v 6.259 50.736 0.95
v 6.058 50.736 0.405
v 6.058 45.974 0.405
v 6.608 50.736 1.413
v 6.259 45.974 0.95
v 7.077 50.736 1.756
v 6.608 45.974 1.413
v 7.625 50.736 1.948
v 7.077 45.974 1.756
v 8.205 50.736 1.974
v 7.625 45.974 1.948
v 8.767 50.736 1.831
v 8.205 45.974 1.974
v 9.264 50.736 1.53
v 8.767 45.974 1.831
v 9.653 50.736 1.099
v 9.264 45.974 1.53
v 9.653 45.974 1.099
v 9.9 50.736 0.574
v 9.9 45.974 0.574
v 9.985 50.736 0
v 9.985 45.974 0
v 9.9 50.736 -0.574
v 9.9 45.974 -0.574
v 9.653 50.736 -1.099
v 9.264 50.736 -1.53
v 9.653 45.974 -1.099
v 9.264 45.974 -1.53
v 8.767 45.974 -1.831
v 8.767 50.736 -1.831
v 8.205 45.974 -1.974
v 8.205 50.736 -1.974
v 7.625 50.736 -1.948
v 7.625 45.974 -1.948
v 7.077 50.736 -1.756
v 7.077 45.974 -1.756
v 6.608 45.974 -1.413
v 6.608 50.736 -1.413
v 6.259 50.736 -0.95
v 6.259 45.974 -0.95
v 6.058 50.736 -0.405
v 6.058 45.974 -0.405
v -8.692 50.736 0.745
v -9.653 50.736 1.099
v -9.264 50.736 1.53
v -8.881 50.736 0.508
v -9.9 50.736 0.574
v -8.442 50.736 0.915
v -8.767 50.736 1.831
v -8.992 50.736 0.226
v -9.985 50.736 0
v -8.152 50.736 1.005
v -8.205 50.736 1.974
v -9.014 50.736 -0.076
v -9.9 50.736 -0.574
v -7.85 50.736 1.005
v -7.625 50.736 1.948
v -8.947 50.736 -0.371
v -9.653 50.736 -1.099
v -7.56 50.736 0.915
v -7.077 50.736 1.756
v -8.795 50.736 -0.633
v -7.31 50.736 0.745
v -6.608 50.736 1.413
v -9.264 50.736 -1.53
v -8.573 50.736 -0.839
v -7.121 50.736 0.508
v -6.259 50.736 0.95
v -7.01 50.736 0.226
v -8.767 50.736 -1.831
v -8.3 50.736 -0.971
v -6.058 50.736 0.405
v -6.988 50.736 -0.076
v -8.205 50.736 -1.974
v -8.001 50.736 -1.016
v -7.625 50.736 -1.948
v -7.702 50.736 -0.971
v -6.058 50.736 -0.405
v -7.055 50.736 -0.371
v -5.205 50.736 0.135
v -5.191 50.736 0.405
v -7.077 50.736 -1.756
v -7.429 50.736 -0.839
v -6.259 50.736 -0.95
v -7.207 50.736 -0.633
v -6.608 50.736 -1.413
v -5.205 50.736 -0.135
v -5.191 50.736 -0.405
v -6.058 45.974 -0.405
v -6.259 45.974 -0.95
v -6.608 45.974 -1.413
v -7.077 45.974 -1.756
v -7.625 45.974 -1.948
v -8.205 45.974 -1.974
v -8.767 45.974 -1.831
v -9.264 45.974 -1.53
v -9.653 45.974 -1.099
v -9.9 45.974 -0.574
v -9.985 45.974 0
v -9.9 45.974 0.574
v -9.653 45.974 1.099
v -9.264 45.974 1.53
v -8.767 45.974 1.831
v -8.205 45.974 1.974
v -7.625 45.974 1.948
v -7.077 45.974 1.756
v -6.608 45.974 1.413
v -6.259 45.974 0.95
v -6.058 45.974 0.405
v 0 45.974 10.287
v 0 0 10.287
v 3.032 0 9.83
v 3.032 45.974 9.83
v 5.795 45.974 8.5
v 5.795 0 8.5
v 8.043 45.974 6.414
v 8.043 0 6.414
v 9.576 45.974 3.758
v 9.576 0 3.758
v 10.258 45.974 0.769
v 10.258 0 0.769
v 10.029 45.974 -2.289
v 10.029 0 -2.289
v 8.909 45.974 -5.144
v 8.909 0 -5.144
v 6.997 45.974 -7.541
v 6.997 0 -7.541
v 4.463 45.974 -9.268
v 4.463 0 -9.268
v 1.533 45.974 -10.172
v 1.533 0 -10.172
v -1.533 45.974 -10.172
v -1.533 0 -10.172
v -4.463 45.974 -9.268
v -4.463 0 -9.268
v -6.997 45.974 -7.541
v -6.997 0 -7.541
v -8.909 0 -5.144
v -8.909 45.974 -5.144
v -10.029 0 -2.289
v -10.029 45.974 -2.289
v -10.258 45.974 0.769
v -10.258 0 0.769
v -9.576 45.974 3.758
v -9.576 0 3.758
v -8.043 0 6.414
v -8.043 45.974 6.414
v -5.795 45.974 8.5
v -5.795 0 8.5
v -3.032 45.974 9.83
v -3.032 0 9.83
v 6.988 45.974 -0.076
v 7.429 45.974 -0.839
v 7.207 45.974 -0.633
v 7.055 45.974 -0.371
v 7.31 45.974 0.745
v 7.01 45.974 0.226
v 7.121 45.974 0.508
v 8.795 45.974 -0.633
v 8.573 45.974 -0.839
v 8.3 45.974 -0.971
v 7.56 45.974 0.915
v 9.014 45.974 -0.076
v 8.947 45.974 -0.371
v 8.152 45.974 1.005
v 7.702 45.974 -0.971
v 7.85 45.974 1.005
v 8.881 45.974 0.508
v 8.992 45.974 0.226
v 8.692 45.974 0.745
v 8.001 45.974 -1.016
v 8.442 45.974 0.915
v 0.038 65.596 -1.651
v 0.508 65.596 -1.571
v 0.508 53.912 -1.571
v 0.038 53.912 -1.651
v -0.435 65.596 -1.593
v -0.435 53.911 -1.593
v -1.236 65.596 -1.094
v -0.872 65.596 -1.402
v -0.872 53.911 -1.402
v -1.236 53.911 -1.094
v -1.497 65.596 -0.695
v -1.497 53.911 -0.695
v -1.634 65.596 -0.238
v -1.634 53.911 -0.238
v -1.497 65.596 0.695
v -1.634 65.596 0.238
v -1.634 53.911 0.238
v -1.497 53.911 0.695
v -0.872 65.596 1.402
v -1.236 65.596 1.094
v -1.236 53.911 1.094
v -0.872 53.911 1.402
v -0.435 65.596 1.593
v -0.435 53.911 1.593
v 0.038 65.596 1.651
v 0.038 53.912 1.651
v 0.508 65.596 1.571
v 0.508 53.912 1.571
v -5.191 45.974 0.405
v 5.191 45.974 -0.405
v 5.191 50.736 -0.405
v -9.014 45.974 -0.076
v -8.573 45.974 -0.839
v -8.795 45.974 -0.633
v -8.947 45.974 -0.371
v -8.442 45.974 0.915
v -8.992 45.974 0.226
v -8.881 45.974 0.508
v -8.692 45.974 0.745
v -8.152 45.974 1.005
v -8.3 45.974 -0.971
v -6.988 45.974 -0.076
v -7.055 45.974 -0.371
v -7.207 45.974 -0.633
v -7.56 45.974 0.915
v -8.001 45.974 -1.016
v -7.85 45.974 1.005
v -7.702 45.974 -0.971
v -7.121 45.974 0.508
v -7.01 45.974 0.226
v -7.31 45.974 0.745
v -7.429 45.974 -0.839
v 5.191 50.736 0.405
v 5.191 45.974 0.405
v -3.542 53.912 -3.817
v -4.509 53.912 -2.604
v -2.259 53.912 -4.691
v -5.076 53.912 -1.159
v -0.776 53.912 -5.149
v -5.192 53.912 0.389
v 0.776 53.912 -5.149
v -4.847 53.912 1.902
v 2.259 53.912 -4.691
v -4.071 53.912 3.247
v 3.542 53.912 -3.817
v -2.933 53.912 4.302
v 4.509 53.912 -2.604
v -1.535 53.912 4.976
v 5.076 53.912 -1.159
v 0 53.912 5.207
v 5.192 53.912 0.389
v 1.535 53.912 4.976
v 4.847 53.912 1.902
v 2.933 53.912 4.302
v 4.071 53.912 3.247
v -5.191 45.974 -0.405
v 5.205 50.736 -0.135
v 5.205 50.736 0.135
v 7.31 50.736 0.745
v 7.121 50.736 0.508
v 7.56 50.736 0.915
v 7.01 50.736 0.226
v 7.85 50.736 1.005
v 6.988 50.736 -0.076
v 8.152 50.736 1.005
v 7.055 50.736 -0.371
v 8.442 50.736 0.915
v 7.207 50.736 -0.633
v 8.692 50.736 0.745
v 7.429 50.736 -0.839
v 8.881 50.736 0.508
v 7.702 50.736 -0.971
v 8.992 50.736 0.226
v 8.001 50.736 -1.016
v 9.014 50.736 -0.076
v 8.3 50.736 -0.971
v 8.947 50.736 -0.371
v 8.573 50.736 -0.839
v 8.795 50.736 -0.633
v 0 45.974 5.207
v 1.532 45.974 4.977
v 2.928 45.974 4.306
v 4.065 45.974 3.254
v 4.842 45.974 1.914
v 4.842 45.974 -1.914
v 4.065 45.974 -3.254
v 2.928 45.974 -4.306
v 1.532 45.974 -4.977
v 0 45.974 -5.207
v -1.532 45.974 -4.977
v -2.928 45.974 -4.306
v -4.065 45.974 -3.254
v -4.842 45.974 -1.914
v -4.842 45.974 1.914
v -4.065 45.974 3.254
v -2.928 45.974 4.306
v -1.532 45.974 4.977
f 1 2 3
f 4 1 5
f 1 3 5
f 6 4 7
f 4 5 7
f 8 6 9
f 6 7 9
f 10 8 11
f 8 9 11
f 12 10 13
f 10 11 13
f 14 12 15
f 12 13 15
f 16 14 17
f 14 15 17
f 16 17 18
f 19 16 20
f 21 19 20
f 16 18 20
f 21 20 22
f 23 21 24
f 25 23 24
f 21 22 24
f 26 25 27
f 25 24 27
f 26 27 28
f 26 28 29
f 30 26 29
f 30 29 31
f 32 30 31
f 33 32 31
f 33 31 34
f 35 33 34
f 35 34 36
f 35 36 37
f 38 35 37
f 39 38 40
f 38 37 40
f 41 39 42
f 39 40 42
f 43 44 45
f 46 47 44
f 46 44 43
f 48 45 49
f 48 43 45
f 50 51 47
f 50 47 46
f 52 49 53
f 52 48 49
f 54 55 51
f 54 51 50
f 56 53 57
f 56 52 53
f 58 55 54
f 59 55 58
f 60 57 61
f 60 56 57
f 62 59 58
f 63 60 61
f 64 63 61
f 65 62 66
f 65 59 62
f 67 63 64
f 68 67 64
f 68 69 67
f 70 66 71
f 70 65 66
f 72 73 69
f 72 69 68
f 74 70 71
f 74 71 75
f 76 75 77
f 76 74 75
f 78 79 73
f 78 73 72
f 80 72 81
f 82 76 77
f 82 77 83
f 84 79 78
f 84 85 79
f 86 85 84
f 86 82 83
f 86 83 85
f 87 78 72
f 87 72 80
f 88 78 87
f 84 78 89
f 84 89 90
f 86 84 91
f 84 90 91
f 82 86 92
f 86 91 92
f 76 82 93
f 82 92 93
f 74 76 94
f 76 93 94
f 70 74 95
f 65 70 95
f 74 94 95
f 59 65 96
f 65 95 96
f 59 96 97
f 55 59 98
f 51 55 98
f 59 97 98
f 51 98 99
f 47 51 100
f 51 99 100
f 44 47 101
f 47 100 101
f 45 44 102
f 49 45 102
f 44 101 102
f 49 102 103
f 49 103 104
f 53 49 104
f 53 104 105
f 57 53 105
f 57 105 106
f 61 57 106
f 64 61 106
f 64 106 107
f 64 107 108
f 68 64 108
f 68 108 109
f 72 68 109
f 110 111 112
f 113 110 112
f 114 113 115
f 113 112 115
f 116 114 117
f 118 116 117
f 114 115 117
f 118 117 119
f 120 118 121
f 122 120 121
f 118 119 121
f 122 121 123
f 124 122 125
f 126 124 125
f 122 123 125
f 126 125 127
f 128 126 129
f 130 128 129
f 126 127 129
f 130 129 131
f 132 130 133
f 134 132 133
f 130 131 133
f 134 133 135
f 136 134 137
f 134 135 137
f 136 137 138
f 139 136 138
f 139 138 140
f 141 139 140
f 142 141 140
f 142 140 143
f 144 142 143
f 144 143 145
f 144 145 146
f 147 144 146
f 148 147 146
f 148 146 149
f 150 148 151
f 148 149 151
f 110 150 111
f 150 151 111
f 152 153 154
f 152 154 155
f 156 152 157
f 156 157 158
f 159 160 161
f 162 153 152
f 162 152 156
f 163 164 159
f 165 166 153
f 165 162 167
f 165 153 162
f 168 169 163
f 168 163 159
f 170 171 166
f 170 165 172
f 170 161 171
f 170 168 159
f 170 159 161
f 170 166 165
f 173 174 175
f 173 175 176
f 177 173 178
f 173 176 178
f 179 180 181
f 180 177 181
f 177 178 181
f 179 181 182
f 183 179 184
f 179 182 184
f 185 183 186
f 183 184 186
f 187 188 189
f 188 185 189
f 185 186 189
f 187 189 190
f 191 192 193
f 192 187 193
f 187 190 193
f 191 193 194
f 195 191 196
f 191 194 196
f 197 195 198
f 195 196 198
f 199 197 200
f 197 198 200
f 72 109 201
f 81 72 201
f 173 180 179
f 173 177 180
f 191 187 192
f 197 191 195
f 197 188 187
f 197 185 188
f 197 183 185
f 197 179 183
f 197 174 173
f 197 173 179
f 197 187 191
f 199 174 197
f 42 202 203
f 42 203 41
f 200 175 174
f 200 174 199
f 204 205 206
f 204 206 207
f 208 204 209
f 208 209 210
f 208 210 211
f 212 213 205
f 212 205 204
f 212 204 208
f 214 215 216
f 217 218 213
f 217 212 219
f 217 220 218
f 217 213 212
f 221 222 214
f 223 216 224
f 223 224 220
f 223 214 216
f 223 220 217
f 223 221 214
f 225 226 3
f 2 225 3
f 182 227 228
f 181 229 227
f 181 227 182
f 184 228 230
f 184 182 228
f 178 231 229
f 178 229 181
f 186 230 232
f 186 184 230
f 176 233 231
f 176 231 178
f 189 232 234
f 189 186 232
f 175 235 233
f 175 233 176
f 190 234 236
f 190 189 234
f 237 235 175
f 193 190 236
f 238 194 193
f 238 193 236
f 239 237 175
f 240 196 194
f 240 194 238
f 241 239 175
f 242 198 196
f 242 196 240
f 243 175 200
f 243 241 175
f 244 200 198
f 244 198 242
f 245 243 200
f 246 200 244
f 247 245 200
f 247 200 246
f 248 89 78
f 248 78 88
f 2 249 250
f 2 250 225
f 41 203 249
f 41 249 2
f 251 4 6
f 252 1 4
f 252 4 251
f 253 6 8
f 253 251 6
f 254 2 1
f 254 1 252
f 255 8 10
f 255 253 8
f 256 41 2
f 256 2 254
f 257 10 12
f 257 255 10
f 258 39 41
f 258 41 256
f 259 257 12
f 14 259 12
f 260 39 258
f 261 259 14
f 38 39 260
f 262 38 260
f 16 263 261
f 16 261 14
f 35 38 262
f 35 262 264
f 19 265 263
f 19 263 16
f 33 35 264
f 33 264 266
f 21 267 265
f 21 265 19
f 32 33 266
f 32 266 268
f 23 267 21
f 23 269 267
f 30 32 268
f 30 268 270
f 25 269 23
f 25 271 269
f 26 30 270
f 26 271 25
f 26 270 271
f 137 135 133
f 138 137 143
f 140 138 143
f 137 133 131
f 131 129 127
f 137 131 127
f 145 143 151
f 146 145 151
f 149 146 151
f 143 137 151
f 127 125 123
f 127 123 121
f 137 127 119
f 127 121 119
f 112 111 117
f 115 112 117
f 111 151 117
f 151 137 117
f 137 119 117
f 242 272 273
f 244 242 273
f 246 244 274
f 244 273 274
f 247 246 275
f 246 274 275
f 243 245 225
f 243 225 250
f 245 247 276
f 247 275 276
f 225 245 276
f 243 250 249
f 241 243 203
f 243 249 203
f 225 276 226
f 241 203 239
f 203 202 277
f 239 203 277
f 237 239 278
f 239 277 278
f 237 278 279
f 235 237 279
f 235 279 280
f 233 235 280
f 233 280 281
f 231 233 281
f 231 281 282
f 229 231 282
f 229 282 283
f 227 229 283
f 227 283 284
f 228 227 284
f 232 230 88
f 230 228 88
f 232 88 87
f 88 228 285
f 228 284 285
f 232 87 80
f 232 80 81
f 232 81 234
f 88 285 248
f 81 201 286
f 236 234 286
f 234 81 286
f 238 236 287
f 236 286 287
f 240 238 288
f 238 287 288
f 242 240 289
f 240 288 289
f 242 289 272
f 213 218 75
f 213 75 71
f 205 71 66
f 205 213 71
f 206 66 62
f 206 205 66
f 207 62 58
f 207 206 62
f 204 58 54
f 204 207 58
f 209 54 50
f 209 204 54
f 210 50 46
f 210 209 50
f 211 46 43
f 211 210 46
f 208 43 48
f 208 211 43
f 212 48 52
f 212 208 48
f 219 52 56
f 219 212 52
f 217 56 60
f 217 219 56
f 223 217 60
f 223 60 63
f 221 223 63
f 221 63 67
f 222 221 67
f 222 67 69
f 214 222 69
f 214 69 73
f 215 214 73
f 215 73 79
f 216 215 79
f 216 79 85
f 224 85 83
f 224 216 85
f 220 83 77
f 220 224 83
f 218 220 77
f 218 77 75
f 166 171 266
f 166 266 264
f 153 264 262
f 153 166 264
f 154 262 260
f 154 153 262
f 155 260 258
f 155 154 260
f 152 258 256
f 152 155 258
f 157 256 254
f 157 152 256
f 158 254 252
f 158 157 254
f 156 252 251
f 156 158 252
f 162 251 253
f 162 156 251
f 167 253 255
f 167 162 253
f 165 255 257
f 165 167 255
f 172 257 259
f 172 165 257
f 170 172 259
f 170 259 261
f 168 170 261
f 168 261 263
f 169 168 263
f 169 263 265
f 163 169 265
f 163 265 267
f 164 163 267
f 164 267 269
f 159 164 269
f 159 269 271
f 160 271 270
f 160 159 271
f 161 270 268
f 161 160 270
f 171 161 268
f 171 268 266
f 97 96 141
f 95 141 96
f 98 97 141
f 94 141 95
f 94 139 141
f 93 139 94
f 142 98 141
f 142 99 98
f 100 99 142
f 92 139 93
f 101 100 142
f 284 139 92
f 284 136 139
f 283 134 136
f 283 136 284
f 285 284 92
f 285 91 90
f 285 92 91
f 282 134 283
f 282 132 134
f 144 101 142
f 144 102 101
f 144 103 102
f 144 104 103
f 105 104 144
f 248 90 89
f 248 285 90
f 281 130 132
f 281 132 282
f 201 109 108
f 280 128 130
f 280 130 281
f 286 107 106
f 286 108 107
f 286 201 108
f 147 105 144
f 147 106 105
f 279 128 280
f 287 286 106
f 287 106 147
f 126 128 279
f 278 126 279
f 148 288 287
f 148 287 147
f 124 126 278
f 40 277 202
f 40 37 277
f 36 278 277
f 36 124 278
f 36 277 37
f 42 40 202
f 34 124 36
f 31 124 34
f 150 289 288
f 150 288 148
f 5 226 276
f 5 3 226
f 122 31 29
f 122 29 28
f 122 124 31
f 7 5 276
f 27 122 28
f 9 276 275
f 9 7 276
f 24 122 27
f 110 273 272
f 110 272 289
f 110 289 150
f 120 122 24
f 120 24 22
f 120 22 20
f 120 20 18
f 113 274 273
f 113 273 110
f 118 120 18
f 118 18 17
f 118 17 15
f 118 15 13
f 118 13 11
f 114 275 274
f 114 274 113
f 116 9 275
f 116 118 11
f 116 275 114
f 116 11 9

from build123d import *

# Parameters (mm, degrees)
SKETCH1_R           = 10.287
BOSS_EXTRUDE1_DEPTH = 45.974
SKETCH2_R           = 5.207
BOSS_EXTRUDE2_DEPTH = 7.9375
SKETCH3_R           = 1.651
BOSS_EXTRUDE3_DEPTH = 11.684
SKETCH4_R           = 1.984375
SKETCH4_R_2         = 1.016
SKETCH4_W           = 12.957418184
SKETCH4_H           = 0.81
BOSS_EXTRUDE5_DEPTH = 4.7625
CUT_EXTRUDE1_DEPTH  = 11.684


with BuildPart() as part:
    # Sketch1 → Boss-Extrude1 (new body)
    with BuildSketch(Plane(origin=(0, 0, 0), x_dir=(1, 0, 0), z_dir=(0, 1, 0))):
        with Locations(Location((0, 0, 0), (0, 0, 270))):
            Circle(SKETCH1_R)
    extrude(amount=BOSS_EXTRUDE1_DEPTH)

    # Sketch2 → Boss-Extrude2 (add)
    with BuildSketch(Plane(origin=(0, 45.974, 0), x_dir=(1, 0, 0), z_dir=(0, 1, 0))):
        with Locations(Location((0, 0, 0), (0, 0, 270))):
            Circle(SKETCH2_R)
    extrude(amount=BOSS_EXTRUDE2_DEPTH)

    # Sketch3 → Boss-Extrude3 (add)
    with BuildSketch(Plane(origin=(0, 53.9115, 0), x_dir=(1, 0, 0), z_dir=(0, 1, 0))):
        with Locations(Location((0, 0, 0), (0, 0, 270))):
            Circle(SKETCH3_R)
    extrude(amount=BOSS_EXTRUDE3_DEPTH)

    # Sketch4 → Boss-Extrude5 (add)
    # profile 1 of 3: a face of its own
    with BuildSketch(Plane(origin=(0, 45.974, 0), x_dir=(1, 0, 0), z_dir=(0, 1, 0))):
        with Locations((-8.001, 0)):
            Circle(SKETCH4_R)
        with Locations(Location((-8.001, 0, 0), (0, 0, 90))):
            Circle(SKETCH4_R_2, mode=Mode.SUBTRACT)
    # profile 2 of 3: a face of its own
    with BuildSketch(Plane(origin=(0, 45.974, 0), x_dir=(1, 0, 0), z_dir=(0, 1, 0))):
        with Locations((8.001, 0)):
            Circle(SKETCH4_R)
        with Locations(Location((8.001, 0, 0), (0, 0, 90))):
            Circle(SKETCH4_R_2, mode=Mode.SUBTRACT)
    # profile 3 of 3: a face of its own
    with BuildSketch(Plane(origin=(0, 45.974, 0), x_dir=(1, 0, 0), z_dir=(0, 1, 0))):
        with Locations((0.016128597, 0)):
            Rectangle(SKETCH4_W, SKETCH4_H)
    extrude(amount=BOSS_EXTRUDE5_DEPTH)

    # Sketch5 → Cut-Extrude1 (cut)
    with BuildSketch(Plane(origin=(0, 65.5955, 0), x_dir=(1, 0, 0), z_dir=(0, 1, 0))):
        Polygon((0.508, 43.642192231), (0.508, 1.570903243), (0.508, -1.570903243), (0.508, -43.642192231), (84.650577975, -43.642192231), (84.650577975, 43.642192231), align=None)
    extrude(amount=-CUT_EXTRUDE1_DEPTH, mode=Mode.SUBTRACT)


solid = part.part
